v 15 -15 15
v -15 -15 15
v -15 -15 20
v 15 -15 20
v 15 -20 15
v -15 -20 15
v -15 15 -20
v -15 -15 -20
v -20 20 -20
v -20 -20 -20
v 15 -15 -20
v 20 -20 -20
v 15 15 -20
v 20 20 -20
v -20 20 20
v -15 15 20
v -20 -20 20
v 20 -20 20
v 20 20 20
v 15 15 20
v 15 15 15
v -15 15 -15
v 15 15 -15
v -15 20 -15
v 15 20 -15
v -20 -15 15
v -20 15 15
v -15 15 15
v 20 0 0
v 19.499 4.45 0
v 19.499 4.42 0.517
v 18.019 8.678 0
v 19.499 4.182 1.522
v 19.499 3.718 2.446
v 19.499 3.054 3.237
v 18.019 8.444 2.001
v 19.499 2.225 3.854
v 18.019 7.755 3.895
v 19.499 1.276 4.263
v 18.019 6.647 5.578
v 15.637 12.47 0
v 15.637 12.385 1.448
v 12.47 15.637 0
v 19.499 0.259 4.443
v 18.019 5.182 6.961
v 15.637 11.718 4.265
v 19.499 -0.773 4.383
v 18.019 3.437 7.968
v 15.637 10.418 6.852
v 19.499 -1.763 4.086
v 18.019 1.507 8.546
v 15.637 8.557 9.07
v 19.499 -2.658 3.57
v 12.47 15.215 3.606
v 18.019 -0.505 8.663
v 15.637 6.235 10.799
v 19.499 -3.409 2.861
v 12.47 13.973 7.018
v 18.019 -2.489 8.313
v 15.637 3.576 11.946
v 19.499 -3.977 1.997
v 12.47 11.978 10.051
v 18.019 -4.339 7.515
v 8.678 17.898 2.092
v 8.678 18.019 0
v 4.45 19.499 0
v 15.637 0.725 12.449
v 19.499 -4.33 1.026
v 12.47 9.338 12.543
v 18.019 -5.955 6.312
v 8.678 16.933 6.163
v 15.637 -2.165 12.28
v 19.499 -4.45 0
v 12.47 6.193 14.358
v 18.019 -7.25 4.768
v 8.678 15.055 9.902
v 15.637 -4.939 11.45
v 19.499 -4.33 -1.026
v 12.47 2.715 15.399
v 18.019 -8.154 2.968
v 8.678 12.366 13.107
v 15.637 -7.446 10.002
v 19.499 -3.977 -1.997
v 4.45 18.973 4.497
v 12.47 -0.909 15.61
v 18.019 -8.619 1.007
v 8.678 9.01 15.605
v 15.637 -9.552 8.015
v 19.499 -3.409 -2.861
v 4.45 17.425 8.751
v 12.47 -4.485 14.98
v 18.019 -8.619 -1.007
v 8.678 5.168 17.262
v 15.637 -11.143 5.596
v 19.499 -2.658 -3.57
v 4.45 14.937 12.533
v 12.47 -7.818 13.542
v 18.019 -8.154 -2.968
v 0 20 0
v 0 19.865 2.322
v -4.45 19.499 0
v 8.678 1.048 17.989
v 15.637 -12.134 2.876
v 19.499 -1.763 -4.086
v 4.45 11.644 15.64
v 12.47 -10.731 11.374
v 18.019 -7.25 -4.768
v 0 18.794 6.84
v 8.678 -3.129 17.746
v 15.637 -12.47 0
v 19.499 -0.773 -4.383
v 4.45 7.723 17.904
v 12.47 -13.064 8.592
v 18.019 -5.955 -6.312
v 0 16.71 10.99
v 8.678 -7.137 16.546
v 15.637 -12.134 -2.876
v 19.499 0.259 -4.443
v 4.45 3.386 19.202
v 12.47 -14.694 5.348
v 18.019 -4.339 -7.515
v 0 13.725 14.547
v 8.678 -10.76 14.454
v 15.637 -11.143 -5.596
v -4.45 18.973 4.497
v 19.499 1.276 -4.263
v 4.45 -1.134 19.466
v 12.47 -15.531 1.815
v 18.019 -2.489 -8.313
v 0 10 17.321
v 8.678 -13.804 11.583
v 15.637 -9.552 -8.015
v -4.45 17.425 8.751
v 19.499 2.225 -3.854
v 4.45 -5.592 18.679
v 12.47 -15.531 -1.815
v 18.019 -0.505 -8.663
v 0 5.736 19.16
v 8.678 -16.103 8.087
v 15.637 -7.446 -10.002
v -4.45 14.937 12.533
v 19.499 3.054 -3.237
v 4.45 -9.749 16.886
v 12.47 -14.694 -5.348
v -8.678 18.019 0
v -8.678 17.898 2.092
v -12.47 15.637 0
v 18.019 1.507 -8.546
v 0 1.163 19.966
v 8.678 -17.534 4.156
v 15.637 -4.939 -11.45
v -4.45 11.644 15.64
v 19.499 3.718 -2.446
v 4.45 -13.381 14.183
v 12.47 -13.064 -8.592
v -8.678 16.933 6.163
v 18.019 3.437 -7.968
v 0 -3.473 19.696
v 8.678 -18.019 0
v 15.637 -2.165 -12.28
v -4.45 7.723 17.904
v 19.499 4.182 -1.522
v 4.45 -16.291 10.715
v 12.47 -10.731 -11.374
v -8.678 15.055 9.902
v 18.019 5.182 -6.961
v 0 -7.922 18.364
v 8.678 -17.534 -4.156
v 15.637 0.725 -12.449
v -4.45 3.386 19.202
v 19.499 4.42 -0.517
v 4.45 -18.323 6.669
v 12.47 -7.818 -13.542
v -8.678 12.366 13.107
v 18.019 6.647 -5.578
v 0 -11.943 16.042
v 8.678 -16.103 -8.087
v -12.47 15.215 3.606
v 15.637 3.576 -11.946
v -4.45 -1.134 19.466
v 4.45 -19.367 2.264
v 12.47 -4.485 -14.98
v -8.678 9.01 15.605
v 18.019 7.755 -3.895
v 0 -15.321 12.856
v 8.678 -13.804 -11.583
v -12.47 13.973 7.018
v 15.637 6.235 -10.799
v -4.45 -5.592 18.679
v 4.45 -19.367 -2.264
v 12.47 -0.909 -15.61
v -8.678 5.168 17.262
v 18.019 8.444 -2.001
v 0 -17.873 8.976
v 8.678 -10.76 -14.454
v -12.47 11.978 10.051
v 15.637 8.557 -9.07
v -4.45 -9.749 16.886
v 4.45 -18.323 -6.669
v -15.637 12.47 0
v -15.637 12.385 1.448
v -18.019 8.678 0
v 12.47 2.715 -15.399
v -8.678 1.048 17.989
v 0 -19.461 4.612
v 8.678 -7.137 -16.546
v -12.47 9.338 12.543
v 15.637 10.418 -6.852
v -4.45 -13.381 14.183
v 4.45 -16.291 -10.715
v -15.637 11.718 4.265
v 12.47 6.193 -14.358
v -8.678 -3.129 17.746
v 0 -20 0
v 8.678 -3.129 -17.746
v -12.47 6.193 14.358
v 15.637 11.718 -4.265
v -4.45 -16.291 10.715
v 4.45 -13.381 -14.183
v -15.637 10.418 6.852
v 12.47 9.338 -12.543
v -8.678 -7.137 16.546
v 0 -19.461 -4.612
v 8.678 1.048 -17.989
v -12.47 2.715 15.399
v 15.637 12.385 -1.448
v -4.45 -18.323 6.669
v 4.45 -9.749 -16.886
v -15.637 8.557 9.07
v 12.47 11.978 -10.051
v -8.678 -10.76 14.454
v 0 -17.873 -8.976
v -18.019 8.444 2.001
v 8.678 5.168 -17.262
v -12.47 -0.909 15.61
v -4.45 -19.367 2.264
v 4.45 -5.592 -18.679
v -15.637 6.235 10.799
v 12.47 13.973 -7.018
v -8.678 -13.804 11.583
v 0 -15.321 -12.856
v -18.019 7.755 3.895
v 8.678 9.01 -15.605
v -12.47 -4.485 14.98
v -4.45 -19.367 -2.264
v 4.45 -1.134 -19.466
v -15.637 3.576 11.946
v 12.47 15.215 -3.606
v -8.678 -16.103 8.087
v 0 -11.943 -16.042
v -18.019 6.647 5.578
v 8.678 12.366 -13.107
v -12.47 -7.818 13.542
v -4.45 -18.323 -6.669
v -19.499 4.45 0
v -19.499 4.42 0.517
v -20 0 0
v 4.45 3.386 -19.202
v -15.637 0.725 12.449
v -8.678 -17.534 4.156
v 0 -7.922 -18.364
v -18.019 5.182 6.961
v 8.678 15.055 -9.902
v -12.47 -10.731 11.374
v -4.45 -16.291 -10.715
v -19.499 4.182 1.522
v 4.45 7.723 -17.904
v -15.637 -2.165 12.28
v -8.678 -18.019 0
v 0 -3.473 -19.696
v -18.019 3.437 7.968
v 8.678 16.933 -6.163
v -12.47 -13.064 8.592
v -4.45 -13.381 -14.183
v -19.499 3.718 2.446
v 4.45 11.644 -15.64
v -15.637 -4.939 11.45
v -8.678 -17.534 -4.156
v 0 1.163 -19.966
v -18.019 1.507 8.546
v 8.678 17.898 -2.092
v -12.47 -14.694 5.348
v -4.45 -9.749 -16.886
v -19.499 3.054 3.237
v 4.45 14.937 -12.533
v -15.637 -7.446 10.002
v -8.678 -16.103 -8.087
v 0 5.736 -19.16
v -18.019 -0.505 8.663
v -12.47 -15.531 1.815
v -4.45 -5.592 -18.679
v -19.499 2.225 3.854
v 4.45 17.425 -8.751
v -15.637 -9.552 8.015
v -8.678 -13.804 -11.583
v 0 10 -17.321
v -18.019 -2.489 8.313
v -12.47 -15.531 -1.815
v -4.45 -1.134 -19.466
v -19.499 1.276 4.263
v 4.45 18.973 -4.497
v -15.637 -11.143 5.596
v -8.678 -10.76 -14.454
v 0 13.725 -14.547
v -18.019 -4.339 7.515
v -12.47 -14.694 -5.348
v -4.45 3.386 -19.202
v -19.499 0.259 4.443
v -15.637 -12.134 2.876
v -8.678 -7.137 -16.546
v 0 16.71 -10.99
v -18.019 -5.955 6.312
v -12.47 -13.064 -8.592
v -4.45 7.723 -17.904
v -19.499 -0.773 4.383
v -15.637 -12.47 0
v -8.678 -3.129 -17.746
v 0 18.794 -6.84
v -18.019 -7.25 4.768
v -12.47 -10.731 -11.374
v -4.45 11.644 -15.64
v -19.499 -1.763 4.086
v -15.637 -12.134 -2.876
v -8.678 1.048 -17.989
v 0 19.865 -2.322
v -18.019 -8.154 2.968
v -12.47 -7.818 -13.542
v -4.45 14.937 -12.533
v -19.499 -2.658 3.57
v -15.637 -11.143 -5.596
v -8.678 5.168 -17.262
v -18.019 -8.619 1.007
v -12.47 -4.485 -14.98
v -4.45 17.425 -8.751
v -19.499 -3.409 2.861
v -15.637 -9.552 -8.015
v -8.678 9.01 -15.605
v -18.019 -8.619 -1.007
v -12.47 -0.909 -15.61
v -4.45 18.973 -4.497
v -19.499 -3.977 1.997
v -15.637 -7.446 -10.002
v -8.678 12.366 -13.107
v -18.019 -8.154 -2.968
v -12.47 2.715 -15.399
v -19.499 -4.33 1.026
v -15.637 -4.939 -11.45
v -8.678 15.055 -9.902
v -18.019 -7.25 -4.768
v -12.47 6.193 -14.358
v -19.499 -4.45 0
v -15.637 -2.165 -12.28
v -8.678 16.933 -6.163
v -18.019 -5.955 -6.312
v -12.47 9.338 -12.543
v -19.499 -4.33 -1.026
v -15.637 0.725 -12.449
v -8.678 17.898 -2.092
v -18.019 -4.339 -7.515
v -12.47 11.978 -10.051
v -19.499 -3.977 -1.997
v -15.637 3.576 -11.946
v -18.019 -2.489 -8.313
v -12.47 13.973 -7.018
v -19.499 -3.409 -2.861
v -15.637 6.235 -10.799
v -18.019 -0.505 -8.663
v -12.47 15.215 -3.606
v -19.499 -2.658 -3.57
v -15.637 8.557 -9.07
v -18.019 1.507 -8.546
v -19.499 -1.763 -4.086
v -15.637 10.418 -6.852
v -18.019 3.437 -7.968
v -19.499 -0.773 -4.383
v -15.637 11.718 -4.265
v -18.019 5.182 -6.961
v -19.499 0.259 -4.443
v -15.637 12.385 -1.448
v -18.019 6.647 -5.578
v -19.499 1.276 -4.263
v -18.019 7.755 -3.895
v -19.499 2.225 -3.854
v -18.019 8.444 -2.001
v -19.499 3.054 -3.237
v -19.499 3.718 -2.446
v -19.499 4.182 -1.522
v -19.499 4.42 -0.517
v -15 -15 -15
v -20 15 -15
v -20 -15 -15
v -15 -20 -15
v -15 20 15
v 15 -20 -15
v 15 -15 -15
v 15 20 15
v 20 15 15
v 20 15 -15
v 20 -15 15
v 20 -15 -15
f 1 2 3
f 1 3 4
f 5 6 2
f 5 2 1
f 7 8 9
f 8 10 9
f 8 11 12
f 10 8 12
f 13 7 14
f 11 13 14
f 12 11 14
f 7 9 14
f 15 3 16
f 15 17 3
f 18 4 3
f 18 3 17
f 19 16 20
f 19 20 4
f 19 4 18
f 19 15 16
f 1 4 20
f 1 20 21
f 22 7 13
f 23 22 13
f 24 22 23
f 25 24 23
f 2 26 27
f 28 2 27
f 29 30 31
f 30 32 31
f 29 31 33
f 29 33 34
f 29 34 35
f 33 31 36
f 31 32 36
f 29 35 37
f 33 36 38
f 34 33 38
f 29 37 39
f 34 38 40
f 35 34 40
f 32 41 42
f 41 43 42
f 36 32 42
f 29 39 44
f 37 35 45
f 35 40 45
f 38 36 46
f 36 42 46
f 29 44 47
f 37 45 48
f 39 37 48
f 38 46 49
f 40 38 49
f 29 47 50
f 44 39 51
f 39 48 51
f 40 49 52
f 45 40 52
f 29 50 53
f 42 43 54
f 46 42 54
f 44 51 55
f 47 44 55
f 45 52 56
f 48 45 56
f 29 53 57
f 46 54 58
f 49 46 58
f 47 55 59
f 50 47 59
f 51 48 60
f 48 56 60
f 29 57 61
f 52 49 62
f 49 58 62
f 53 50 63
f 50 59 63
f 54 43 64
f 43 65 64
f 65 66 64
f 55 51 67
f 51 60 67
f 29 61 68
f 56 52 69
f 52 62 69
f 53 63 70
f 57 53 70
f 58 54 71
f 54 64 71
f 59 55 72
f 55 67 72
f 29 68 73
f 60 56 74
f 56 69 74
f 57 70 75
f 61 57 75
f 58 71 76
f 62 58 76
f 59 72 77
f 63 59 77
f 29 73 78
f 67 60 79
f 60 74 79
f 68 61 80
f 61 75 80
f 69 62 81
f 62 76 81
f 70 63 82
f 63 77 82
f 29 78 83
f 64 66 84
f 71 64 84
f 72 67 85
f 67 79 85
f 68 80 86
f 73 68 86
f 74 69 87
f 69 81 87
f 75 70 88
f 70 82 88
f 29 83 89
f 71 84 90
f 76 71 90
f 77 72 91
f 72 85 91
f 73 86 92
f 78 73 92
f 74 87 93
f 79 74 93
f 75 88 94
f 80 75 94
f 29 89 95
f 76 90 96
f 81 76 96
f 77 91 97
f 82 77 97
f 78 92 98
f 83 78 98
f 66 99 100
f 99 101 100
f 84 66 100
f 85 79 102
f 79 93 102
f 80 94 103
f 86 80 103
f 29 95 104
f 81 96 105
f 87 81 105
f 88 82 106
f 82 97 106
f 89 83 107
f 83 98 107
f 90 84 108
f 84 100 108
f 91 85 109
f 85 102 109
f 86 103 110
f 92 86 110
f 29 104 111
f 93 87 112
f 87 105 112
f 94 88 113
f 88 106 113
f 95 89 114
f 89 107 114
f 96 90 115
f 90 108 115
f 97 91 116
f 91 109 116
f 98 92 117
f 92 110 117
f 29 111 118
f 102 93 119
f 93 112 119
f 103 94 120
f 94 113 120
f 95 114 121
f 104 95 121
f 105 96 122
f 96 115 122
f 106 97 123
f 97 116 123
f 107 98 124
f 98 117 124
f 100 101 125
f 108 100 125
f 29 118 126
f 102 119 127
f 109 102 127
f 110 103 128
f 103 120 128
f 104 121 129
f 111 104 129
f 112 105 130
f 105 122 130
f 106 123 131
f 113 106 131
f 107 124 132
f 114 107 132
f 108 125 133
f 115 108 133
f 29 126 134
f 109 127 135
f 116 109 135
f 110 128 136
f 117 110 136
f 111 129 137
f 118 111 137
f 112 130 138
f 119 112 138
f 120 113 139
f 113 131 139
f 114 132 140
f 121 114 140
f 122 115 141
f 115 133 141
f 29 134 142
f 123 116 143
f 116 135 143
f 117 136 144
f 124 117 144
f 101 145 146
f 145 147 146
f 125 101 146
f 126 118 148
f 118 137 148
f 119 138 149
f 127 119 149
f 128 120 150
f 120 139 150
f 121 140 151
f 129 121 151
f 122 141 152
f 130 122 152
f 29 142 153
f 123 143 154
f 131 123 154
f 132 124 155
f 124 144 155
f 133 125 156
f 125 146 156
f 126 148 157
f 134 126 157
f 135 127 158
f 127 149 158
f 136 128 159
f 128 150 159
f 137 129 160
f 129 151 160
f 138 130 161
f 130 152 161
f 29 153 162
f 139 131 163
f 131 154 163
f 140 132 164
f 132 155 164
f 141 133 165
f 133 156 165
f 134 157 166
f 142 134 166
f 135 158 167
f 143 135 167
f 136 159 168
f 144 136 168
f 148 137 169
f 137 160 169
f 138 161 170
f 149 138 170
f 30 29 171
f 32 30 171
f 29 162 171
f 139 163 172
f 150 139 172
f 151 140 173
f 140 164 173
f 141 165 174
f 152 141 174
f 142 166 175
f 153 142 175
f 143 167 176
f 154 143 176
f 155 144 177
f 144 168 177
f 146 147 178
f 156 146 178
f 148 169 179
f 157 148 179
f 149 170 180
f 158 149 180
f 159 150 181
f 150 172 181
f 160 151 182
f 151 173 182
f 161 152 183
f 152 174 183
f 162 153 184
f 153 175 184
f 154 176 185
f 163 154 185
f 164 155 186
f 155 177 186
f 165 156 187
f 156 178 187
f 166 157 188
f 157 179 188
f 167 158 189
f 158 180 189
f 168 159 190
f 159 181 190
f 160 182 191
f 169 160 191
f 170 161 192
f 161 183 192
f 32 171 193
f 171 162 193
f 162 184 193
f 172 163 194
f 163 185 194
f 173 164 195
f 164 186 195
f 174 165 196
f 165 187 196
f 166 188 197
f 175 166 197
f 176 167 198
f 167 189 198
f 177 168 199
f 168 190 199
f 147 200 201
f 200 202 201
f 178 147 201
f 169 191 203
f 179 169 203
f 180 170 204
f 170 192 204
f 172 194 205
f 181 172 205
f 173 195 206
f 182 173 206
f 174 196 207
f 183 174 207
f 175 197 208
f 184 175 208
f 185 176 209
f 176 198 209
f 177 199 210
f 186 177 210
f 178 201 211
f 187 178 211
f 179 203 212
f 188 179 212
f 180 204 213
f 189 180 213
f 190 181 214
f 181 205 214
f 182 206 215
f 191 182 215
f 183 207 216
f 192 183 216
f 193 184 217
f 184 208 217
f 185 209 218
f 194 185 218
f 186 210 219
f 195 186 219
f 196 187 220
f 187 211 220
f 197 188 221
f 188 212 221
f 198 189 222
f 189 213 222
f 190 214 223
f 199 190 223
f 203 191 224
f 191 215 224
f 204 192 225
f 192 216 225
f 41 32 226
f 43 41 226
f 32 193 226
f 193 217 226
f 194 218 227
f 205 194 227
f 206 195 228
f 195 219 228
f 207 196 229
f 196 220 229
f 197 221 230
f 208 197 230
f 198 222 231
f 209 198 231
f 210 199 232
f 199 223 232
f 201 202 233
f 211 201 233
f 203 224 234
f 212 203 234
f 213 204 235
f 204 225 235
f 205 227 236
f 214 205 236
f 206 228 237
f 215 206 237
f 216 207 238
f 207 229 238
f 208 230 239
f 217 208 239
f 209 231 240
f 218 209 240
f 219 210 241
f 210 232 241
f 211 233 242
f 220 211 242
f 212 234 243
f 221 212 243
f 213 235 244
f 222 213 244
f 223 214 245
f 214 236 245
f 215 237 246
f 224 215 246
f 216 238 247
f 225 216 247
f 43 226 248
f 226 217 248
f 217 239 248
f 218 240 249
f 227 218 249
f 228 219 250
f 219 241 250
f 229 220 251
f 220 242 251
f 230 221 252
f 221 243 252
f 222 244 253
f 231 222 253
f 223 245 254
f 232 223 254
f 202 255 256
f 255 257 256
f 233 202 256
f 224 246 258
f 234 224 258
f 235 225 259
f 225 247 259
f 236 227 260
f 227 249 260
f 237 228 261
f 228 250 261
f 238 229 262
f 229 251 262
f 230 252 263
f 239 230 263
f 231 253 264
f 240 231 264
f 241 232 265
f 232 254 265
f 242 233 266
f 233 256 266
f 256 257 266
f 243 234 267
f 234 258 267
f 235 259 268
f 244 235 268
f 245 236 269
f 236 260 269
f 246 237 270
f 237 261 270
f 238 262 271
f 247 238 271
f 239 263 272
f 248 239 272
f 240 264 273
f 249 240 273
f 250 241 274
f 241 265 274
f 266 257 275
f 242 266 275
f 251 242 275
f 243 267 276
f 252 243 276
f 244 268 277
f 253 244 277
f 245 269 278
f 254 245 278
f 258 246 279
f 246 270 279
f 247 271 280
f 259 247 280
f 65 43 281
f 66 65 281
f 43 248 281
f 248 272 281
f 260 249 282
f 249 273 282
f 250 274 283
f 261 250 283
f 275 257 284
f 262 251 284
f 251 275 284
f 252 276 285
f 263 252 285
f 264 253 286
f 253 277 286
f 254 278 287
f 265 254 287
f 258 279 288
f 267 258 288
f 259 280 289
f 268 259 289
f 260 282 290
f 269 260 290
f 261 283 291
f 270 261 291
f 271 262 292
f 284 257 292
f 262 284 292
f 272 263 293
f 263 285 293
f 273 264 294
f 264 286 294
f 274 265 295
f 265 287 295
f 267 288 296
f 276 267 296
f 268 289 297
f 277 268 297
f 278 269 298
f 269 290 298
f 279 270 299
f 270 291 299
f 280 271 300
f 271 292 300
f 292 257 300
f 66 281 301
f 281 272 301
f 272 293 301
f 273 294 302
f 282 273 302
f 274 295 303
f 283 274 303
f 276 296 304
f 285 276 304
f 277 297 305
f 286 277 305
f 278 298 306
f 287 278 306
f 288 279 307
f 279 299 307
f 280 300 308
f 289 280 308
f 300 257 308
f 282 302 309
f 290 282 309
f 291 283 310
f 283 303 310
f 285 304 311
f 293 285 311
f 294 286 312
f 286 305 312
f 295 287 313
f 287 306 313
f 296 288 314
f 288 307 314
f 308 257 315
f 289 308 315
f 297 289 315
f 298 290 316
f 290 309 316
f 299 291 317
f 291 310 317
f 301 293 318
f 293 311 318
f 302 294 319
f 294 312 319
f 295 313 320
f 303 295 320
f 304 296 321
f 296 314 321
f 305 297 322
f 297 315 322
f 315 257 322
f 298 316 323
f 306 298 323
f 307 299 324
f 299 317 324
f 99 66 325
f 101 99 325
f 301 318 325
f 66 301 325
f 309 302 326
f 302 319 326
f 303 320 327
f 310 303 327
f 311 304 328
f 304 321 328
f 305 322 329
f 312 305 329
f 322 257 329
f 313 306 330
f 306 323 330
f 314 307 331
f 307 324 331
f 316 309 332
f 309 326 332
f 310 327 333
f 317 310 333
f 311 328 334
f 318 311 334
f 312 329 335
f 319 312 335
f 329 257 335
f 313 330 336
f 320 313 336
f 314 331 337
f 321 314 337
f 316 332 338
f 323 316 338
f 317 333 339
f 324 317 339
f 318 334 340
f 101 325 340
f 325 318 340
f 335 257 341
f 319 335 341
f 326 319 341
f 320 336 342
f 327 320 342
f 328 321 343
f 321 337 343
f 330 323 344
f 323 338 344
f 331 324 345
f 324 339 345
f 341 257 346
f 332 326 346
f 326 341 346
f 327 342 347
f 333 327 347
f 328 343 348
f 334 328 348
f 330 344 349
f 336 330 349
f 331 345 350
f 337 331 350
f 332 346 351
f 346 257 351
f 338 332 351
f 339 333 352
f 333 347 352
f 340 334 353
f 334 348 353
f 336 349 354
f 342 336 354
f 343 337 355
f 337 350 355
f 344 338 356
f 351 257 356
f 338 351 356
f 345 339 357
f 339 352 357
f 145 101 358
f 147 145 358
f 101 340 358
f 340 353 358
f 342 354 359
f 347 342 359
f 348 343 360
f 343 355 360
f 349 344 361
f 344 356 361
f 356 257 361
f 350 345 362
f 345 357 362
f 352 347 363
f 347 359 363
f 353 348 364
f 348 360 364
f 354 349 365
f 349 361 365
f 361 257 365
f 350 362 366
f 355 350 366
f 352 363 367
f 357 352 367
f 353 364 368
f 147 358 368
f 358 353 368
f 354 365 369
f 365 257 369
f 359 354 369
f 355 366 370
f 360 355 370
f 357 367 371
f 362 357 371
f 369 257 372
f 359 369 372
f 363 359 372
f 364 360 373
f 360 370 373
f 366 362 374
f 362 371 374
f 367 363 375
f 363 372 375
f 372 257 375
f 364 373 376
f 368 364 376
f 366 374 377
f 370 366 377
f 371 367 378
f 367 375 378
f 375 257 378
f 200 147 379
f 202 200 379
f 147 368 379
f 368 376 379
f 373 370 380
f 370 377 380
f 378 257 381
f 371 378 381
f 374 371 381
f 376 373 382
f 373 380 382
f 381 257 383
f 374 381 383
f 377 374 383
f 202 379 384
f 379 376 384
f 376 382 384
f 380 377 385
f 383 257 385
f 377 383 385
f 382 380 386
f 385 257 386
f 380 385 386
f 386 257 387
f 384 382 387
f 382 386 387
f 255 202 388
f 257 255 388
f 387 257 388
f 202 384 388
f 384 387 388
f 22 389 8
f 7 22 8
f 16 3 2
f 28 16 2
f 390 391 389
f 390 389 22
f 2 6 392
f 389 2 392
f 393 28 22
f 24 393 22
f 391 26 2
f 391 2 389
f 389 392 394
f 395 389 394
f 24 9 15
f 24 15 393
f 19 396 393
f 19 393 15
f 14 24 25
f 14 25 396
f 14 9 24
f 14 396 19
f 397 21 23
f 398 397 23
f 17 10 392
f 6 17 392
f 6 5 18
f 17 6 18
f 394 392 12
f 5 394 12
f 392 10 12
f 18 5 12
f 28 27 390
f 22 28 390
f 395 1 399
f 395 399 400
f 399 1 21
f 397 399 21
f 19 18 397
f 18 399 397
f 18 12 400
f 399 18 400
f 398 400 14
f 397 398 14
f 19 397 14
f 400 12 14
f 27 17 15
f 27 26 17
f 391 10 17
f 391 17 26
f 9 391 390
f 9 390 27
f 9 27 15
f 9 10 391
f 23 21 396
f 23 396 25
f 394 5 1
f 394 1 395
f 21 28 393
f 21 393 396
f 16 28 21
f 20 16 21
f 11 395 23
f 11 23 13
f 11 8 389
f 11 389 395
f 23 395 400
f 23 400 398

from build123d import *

# Parameters (mm, degrees)
BOSS_EXTRUDE1_DEPTH      = 20
BOSS_EXTRUDE1_DEPTH_BACK = 20
SKETCH1_W                = 40
SKETCH1_H                = 40
CUT_EXTRUDE1_DEPTH       = 35.641016151
CUT_EXTRUDE1_DEPTH_BACK  = 35.641016151
SKETCH2_W                = 30
SKETCH2_H                = 30
CUT_EXTRUDE2_DEPTH       = 35.641016151
CUT_EXTRUDE2_DEPTH_BACK  = 35.641016151
SKETCH3_W                = 30
SKETCH3_H                = 30
CUT_EXTRUDE3_DEPTH       = 35.641016151
CUT_EXTRUDE3_DEPTH_BACK  = 35.641016151
SKETCH4_W                = 30
SKETCH4_H                = 30


with BuildPart() as part:
    # Sketch1 → Boss-Extrude1 (new, two sides: drawn at the far end of the back side and taken through both)
    with BuildSketch(Plane.XY.offset(-BOSS_EXTRUDE1_DEPTH_BACK)):
        Rectangle(SKETCH1_W, SKETCH1_H)
    extrude(amount=BOSS_EXTRUDE1_DEPTH + BOSS_EXTRUDE1_DEPTH_BACK)

    # Sketch2 → Cut-Extrude1 (cut, two sides: drawn at the far end of the back side and taken through both)
    with BuildSketch(Plane.XY.offset(-CUT_EXTRUDE1_DEPTH_BACK)):
        Rectangle(SKETCH2_W, SKETCH2_H)
    extrude(amount=CUT_EXTRUDE1_DEPTH + CUT_EXTRUDE1_DEPTH_BACK, mode=Mode.SUBTRACT)

    # Sketch3 → Cut-Extrude2 (cut, two sides: drawn at the far end of the back side and taken through both)
    with BuildSketch(Plane(origin=(0, 0, 0), x_dir=(1, 0, 0), z_dir=(0, 1, 0)).offset(-CUT_EXTRUDE2_DEPTH_BACK)):
        Rectangle(SKETCH3_W, SKETCH3_H)
    extrude(amount=CUT_EXTRUDE2_DEPTH + CUT_EXTRUDE2_DEPTH_BACK, mode=Mode.SUBTRACT)

    # Sketch4 → Cut-Extrude3 (cut, two sides: drawn at the far end of the back side and taken through both)
    with BuildSketch(Plane(origin=(0, 0, 0), x_dir=(0, 0, -1), z_dir=(1, 0, 0)).offset(-CUT_EXTRUDE3_DEPTH_BACK)):
        Rectangle(SKETCH4_W, SKETCH4_H)
    extrude(amount=CUT_EXTRUDE3_DEPTH + CUT_EXTRUDE3_DEPTH_BACK, mode=Mode.SUBTRACT)


with BuildPart() as body_2:
    # Sketch5 → Revolve1 (revolve)
    with BuildSketch(Plane.XY):
        with BuildLine():
            Line((-20, 0), (20, 0))
            ThreePointArc((20, 0), (0, 20), (-20, 0))
        make_face()
    revolve(axis=Axis((-20, 0, 0), (1, 0, 0)))


solid = Compound([part.part, body_2.part])
